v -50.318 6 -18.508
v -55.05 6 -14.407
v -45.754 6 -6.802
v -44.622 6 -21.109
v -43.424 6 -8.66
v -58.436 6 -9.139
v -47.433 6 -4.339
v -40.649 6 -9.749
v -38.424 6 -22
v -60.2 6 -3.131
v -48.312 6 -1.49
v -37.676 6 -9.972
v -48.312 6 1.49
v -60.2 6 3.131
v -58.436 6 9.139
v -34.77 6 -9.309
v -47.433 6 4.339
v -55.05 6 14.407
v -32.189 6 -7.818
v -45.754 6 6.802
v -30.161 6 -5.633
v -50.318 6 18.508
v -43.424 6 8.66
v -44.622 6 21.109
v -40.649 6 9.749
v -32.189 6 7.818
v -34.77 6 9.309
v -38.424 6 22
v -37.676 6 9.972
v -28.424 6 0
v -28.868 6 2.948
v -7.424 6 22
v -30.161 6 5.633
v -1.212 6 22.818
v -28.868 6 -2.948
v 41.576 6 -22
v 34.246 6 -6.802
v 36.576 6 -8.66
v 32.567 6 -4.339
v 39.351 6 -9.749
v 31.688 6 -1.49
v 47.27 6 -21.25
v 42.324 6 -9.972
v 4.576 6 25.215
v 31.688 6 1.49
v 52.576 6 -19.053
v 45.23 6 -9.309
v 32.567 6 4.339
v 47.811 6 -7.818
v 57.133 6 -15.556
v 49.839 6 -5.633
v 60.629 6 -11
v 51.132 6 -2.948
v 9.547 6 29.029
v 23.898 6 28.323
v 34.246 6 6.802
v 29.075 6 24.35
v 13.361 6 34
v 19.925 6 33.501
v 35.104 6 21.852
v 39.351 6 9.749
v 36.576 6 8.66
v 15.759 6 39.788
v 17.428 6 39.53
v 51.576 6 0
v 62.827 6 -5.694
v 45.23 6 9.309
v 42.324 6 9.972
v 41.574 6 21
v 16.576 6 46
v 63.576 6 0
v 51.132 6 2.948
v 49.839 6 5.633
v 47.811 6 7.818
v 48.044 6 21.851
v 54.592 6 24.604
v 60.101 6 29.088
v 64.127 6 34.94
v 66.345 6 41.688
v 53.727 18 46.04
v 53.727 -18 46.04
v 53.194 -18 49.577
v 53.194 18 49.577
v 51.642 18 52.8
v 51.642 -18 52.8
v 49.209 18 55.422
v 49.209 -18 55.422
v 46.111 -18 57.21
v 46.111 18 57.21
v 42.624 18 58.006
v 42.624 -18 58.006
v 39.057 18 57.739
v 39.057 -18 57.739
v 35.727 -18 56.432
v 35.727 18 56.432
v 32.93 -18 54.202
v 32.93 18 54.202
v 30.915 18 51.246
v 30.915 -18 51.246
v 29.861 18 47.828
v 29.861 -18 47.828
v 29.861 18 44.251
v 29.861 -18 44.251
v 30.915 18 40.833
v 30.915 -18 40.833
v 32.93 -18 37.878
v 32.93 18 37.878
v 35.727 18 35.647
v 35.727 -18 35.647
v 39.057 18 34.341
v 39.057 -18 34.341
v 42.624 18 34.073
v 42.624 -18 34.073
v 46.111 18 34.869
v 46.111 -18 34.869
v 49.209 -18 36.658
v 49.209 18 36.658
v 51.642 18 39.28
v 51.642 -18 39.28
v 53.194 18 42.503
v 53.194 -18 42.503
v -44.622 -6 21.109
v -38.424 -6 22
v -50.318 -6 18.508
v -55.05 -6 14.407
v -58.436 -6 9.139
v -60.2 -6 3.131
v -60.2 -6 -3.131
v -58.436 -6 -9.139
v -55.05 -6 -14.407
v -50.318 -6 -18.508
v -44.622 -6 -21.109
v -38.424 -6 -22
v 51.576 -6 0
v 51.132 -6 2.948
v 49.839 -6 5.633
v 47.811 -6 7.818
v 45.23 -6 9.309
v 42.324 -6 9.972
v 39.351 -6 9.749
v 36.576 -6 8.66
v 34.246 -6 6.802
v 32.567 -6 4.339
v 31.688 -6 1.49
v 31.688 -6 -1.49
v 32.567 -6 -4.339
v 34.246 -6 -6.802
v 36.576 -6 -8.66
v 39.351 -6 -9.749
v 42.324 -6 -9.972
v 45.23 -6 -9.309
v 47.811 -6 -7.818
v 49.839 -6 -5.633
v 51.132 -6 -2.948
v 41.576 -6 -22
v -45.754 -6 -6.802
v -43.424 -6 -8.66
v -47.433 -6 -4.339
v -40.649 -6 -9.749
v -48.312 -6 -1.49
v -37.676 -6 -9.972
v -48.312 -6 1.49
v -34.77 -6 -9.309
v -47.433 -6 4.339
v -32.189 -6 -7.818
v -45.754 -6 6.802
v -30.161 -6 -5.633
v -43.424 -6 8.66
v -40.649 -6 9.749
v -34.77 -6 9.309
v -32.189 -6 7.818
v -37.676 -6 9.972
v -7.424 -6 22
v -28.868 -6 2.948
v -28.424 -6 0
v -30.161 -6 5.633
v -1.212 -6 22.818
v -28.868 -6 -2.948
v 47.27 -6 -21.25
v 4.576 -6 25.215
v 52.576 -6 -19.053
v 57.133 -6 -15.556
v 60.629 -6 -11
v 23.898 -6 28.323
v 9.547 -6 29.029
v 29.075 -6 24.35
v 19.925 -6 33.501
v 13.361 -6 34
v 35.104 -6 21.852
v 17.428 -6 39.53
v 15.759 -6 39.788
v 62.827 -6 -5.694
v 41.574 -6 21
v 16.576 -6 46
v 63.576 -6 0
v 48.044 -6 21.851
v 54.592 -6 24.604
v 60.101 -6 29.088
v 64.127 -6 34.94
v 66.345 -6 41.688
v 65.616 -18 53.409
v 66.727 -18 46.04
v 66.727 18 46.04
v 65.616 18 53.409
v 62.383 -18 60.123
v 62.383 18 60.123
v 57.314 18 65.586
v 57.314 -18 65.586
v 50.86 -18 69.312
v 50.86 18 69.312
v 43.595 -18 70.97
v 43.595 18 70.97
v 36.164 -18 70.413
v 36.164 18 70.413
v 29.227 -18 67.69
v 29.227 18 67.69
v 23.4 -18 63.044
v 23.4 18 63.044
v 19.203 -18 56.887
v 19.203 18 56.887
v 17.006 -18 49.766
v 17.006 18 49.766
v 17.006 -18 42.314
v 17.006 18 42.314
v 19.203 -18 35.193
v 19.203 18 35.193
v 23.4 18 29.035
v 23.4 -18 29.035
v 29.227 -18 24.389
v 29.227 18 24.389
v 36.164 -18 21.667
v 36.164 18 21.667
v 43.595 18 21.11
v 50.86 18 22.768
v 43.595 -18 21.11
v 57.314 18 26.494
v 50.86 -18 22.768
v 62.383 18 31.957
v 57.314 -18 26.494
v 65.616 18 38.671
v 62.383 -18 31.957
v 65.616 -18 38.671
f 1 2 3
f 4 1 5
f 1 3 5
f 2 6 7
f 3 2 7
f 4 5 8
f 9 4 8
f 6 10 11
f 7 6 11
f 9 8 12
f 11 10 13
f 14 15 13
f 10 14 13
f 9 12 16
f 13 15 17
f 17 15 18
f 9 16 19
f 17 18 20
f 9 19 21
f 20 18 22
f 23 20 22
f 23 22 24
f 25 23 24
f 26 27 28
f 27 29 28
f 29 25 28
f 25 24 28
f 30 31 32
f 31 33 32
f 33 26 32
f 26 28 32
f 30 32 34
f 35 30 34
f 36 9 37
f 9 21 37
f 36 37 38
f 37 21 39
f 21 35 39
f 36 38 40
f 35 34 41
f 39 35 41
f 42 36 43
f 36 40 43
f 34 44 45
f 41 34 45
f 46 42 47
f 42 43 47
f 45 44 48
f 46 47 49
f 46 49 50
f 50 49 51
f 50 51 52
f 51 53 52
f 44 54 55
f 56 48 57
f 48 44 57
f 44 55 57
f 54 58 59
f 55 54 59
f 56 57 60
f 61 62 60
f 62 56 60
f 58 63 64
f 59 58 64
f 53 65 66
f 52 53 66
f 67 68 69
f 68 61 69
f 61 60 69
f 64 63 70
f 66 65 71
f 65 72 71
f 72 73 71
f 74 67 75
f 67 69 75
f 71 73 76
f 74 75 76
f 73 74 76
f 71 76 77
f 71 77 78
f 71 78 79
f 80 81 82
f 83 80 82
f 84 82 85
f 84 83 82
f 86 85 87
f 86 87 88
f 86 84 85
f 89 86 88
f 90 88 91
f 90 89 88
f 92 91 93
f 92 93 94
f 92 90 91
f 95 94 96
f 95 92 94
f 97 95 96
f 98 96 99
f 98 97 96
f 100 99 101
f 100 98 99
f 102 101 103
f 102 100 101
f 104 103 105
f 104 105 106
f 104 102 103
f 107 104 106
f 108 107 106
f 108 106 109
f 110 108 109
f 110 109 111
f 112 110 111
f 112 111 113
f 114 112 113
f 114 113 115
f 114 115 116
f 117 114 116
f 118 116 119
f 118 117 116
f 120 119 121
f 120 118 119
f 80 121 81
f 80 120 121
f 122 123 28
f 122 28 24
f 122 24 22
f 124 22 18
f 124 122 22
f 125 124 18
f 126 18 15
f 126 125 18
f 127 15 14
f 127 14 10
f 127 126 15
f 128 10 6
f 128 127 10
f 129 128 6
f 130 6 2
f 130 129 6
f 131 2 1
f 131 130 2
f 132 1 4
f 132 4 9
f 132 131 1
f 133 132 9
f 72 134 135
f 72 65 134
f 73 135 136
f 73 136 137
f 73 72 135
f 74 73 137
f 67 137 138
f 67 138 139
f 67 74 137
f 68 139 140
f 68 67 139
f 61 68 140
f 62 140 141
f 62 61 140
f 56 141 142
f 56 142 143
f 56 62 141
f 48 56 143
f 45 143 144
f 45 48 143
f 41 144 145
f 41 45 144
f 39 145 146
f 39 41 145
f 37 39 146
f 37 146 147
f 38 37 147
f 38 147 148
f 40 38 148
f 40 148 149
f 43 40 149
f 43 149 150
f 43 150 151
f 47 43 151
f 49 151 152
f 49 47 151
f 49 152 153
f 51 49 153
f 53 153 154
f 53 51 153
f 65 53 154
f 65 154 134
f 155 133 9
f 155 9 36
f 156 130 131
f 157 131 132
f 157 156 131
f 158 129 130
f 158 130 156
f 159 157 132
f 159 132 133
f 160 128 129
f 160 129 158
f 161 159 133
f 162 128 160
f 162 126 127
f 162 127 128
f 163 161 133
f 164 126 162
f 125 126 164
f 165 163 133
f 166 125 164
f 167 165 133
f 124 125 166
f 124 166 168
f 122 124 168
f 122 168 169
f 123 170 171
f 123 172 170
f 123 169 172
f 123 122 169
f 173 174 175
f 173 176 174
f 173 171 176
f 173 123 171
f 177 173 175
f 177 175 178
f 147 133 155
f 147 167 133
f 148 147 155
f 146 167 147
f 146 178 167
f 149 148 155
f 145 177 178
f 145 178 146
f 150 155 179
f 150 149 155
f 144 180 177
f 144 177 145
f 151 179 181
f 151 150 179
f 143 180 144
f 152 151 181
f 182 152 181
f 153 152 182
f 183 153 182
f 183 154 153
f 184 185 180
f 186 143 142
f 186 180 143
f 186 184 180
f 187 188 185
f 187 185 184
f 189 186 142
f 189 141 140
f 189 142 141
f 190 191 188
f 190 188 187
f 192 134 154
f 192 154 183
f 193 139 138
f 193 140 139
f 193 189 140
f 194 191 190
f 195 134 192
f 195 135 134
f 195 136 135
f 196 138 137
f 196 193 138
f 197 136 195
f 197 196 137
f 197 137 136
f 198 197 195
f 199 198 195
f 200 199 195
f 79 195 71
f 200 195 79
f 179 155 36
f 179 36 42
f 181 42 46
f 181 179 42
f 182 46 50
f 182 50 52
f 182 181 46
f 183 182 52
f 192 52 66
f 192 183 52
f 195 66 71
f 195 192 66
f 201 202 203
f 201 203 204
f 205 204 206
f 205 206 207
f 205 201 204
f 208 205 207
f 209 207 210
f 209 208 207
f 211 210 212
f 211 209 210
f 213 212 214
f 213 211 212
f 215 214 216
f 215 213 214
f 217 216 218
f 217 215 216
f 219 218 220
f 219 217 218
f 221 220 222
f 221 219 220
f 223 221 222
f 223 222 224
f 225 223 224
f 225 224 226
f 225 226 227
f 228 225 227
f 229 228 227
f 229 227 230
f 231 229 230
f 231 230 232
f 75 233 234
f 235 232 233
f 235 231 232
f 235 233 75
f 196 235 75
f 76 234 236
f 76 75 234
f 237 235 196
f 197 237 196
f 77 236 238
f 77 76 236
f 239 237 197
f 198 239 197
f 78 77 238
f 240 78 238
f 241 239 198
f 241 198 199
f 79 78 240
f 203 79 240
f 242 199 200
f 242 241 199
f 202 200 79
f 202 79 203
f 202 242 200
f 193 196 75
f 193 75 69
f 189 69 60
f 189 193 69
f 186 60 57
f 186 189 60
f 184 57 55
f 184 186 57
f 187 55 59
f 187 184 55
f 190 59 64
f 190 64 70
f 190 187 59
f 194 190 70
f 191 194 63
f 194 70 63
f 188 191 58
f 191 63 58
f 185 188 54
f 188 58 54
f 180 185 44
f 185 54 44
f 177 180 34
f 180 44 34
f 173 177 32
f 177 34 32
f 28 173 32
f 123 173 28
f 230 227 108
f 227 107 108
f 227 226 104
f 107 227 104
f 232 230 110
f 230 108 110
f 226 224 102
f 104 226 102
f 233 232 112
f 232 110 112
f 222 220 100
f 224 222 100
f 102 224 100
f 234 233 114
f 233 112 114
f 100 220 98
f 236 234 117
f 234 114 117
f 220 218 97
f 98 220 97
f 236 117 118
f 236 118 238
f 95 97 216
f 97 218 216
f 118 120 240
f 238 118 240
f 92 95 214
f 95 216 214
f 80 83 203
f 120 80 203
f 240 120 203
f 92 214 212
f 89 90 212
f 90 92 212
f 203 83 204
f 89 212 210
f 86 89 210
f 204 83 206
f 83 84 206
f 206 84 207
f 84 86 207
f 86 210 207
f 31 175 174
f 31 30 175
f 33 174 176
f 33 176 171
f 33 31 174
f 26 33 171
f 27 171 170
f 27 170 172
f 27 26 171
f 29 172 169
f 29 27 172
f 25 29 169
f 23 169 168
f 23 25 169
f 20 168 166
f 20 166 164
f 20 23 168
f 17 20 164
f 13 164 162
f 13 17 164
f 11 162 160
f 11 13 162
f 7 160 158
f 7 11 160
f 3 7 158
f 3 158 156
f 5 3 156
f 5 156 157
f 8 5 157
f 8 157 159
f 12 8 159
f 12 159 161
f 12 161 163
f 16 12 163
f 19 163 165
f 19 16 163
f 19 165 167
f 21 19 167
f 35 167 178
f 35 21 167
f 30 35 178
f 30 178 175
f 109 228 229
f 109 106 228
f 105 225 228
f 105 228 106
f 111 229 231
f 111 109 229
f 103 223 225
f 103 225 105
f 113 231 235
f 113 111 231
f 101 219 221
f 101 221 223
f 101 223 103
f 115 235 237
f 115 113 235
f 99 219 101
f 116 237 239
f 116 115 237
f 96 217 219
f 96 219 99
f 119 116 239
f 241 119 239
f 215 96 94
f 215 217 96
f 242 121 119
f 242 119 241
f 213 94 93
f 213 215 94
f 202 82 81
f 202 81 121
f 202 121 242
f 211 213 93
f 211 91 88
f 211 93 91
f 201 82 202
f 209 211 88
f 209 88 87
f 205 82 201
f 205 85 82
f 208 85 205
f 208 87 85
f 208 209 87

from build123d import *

# Parameters (mm, degrees)
F0_R     = 10
F1_DEPTH = 6
F2_R     = 25
F2_R_2   = 12
F3_DEPTH = 18
F4_R     = 23.9999


# Not quite as in the source:
# - a fillet or chamfer is up to 0.001 mm smaller than in the source, because OpenCascade refuses the exact size


with BuildPart() as f1:
    # F0 (on Front) → F1 (new body, symmetric)
    with BuildSketch(Plane.XZ):
        with BuildLine():
            Line((16.57635398, 22), (-38.42364602, 22))
            ThreePointArc((-38.42364602, 22), (-60.42364602, 0), (-38.42364602, -22))
            Line((-38.42364602, -22), (41.57635398, -22))
            ThreePointArc((41.57635398, -22), (57.1327031661, -15.5563491861), (63.57635398, 0))
            Line((63.57635398, 0), (66.521399326, 44.3432825568))
            ThreePointArc((66.521399326, 44.3432825568), (40.7475396611, 21.0137424406), (16.57635398, 46))
            Line((16.57635398, 46), (16.57635398, 22))
        make_face()
        with Locations((-38.42364602, 0)):
            Circle(F0_R, mode=Mode.SUBTRACT)
        with Locations((41.57635398, 0)):
            Circle(F0_R, mode=Mode.SUBTRACT)
    extrude(amount=F1_DEPTH, both=True)

    # F2 (on Front) → F3 (join, symmetric)
    with BuildSketch(Plane.XZ):
        with Locations((41.726754687, 46.0397801568)):
            Circle(F2_R)
        with Locations((41.726754687, 46.0397801568)):
            Circle(F2_R_2, mode=Mode.SUBTRACT)
    extrude(amount=F3_DEPTH, both=True)

    # F4 (radius 24 in the source; OpenCascade refuses exactly that, so slightly less here)
    f4_edges = [f1.edges().sort_by_distance(p)[0] for p in [
        (16.576354, 0, 22),
    ]]
    fillet(f4_edges, radius=F4_R)


solid = f1.part
